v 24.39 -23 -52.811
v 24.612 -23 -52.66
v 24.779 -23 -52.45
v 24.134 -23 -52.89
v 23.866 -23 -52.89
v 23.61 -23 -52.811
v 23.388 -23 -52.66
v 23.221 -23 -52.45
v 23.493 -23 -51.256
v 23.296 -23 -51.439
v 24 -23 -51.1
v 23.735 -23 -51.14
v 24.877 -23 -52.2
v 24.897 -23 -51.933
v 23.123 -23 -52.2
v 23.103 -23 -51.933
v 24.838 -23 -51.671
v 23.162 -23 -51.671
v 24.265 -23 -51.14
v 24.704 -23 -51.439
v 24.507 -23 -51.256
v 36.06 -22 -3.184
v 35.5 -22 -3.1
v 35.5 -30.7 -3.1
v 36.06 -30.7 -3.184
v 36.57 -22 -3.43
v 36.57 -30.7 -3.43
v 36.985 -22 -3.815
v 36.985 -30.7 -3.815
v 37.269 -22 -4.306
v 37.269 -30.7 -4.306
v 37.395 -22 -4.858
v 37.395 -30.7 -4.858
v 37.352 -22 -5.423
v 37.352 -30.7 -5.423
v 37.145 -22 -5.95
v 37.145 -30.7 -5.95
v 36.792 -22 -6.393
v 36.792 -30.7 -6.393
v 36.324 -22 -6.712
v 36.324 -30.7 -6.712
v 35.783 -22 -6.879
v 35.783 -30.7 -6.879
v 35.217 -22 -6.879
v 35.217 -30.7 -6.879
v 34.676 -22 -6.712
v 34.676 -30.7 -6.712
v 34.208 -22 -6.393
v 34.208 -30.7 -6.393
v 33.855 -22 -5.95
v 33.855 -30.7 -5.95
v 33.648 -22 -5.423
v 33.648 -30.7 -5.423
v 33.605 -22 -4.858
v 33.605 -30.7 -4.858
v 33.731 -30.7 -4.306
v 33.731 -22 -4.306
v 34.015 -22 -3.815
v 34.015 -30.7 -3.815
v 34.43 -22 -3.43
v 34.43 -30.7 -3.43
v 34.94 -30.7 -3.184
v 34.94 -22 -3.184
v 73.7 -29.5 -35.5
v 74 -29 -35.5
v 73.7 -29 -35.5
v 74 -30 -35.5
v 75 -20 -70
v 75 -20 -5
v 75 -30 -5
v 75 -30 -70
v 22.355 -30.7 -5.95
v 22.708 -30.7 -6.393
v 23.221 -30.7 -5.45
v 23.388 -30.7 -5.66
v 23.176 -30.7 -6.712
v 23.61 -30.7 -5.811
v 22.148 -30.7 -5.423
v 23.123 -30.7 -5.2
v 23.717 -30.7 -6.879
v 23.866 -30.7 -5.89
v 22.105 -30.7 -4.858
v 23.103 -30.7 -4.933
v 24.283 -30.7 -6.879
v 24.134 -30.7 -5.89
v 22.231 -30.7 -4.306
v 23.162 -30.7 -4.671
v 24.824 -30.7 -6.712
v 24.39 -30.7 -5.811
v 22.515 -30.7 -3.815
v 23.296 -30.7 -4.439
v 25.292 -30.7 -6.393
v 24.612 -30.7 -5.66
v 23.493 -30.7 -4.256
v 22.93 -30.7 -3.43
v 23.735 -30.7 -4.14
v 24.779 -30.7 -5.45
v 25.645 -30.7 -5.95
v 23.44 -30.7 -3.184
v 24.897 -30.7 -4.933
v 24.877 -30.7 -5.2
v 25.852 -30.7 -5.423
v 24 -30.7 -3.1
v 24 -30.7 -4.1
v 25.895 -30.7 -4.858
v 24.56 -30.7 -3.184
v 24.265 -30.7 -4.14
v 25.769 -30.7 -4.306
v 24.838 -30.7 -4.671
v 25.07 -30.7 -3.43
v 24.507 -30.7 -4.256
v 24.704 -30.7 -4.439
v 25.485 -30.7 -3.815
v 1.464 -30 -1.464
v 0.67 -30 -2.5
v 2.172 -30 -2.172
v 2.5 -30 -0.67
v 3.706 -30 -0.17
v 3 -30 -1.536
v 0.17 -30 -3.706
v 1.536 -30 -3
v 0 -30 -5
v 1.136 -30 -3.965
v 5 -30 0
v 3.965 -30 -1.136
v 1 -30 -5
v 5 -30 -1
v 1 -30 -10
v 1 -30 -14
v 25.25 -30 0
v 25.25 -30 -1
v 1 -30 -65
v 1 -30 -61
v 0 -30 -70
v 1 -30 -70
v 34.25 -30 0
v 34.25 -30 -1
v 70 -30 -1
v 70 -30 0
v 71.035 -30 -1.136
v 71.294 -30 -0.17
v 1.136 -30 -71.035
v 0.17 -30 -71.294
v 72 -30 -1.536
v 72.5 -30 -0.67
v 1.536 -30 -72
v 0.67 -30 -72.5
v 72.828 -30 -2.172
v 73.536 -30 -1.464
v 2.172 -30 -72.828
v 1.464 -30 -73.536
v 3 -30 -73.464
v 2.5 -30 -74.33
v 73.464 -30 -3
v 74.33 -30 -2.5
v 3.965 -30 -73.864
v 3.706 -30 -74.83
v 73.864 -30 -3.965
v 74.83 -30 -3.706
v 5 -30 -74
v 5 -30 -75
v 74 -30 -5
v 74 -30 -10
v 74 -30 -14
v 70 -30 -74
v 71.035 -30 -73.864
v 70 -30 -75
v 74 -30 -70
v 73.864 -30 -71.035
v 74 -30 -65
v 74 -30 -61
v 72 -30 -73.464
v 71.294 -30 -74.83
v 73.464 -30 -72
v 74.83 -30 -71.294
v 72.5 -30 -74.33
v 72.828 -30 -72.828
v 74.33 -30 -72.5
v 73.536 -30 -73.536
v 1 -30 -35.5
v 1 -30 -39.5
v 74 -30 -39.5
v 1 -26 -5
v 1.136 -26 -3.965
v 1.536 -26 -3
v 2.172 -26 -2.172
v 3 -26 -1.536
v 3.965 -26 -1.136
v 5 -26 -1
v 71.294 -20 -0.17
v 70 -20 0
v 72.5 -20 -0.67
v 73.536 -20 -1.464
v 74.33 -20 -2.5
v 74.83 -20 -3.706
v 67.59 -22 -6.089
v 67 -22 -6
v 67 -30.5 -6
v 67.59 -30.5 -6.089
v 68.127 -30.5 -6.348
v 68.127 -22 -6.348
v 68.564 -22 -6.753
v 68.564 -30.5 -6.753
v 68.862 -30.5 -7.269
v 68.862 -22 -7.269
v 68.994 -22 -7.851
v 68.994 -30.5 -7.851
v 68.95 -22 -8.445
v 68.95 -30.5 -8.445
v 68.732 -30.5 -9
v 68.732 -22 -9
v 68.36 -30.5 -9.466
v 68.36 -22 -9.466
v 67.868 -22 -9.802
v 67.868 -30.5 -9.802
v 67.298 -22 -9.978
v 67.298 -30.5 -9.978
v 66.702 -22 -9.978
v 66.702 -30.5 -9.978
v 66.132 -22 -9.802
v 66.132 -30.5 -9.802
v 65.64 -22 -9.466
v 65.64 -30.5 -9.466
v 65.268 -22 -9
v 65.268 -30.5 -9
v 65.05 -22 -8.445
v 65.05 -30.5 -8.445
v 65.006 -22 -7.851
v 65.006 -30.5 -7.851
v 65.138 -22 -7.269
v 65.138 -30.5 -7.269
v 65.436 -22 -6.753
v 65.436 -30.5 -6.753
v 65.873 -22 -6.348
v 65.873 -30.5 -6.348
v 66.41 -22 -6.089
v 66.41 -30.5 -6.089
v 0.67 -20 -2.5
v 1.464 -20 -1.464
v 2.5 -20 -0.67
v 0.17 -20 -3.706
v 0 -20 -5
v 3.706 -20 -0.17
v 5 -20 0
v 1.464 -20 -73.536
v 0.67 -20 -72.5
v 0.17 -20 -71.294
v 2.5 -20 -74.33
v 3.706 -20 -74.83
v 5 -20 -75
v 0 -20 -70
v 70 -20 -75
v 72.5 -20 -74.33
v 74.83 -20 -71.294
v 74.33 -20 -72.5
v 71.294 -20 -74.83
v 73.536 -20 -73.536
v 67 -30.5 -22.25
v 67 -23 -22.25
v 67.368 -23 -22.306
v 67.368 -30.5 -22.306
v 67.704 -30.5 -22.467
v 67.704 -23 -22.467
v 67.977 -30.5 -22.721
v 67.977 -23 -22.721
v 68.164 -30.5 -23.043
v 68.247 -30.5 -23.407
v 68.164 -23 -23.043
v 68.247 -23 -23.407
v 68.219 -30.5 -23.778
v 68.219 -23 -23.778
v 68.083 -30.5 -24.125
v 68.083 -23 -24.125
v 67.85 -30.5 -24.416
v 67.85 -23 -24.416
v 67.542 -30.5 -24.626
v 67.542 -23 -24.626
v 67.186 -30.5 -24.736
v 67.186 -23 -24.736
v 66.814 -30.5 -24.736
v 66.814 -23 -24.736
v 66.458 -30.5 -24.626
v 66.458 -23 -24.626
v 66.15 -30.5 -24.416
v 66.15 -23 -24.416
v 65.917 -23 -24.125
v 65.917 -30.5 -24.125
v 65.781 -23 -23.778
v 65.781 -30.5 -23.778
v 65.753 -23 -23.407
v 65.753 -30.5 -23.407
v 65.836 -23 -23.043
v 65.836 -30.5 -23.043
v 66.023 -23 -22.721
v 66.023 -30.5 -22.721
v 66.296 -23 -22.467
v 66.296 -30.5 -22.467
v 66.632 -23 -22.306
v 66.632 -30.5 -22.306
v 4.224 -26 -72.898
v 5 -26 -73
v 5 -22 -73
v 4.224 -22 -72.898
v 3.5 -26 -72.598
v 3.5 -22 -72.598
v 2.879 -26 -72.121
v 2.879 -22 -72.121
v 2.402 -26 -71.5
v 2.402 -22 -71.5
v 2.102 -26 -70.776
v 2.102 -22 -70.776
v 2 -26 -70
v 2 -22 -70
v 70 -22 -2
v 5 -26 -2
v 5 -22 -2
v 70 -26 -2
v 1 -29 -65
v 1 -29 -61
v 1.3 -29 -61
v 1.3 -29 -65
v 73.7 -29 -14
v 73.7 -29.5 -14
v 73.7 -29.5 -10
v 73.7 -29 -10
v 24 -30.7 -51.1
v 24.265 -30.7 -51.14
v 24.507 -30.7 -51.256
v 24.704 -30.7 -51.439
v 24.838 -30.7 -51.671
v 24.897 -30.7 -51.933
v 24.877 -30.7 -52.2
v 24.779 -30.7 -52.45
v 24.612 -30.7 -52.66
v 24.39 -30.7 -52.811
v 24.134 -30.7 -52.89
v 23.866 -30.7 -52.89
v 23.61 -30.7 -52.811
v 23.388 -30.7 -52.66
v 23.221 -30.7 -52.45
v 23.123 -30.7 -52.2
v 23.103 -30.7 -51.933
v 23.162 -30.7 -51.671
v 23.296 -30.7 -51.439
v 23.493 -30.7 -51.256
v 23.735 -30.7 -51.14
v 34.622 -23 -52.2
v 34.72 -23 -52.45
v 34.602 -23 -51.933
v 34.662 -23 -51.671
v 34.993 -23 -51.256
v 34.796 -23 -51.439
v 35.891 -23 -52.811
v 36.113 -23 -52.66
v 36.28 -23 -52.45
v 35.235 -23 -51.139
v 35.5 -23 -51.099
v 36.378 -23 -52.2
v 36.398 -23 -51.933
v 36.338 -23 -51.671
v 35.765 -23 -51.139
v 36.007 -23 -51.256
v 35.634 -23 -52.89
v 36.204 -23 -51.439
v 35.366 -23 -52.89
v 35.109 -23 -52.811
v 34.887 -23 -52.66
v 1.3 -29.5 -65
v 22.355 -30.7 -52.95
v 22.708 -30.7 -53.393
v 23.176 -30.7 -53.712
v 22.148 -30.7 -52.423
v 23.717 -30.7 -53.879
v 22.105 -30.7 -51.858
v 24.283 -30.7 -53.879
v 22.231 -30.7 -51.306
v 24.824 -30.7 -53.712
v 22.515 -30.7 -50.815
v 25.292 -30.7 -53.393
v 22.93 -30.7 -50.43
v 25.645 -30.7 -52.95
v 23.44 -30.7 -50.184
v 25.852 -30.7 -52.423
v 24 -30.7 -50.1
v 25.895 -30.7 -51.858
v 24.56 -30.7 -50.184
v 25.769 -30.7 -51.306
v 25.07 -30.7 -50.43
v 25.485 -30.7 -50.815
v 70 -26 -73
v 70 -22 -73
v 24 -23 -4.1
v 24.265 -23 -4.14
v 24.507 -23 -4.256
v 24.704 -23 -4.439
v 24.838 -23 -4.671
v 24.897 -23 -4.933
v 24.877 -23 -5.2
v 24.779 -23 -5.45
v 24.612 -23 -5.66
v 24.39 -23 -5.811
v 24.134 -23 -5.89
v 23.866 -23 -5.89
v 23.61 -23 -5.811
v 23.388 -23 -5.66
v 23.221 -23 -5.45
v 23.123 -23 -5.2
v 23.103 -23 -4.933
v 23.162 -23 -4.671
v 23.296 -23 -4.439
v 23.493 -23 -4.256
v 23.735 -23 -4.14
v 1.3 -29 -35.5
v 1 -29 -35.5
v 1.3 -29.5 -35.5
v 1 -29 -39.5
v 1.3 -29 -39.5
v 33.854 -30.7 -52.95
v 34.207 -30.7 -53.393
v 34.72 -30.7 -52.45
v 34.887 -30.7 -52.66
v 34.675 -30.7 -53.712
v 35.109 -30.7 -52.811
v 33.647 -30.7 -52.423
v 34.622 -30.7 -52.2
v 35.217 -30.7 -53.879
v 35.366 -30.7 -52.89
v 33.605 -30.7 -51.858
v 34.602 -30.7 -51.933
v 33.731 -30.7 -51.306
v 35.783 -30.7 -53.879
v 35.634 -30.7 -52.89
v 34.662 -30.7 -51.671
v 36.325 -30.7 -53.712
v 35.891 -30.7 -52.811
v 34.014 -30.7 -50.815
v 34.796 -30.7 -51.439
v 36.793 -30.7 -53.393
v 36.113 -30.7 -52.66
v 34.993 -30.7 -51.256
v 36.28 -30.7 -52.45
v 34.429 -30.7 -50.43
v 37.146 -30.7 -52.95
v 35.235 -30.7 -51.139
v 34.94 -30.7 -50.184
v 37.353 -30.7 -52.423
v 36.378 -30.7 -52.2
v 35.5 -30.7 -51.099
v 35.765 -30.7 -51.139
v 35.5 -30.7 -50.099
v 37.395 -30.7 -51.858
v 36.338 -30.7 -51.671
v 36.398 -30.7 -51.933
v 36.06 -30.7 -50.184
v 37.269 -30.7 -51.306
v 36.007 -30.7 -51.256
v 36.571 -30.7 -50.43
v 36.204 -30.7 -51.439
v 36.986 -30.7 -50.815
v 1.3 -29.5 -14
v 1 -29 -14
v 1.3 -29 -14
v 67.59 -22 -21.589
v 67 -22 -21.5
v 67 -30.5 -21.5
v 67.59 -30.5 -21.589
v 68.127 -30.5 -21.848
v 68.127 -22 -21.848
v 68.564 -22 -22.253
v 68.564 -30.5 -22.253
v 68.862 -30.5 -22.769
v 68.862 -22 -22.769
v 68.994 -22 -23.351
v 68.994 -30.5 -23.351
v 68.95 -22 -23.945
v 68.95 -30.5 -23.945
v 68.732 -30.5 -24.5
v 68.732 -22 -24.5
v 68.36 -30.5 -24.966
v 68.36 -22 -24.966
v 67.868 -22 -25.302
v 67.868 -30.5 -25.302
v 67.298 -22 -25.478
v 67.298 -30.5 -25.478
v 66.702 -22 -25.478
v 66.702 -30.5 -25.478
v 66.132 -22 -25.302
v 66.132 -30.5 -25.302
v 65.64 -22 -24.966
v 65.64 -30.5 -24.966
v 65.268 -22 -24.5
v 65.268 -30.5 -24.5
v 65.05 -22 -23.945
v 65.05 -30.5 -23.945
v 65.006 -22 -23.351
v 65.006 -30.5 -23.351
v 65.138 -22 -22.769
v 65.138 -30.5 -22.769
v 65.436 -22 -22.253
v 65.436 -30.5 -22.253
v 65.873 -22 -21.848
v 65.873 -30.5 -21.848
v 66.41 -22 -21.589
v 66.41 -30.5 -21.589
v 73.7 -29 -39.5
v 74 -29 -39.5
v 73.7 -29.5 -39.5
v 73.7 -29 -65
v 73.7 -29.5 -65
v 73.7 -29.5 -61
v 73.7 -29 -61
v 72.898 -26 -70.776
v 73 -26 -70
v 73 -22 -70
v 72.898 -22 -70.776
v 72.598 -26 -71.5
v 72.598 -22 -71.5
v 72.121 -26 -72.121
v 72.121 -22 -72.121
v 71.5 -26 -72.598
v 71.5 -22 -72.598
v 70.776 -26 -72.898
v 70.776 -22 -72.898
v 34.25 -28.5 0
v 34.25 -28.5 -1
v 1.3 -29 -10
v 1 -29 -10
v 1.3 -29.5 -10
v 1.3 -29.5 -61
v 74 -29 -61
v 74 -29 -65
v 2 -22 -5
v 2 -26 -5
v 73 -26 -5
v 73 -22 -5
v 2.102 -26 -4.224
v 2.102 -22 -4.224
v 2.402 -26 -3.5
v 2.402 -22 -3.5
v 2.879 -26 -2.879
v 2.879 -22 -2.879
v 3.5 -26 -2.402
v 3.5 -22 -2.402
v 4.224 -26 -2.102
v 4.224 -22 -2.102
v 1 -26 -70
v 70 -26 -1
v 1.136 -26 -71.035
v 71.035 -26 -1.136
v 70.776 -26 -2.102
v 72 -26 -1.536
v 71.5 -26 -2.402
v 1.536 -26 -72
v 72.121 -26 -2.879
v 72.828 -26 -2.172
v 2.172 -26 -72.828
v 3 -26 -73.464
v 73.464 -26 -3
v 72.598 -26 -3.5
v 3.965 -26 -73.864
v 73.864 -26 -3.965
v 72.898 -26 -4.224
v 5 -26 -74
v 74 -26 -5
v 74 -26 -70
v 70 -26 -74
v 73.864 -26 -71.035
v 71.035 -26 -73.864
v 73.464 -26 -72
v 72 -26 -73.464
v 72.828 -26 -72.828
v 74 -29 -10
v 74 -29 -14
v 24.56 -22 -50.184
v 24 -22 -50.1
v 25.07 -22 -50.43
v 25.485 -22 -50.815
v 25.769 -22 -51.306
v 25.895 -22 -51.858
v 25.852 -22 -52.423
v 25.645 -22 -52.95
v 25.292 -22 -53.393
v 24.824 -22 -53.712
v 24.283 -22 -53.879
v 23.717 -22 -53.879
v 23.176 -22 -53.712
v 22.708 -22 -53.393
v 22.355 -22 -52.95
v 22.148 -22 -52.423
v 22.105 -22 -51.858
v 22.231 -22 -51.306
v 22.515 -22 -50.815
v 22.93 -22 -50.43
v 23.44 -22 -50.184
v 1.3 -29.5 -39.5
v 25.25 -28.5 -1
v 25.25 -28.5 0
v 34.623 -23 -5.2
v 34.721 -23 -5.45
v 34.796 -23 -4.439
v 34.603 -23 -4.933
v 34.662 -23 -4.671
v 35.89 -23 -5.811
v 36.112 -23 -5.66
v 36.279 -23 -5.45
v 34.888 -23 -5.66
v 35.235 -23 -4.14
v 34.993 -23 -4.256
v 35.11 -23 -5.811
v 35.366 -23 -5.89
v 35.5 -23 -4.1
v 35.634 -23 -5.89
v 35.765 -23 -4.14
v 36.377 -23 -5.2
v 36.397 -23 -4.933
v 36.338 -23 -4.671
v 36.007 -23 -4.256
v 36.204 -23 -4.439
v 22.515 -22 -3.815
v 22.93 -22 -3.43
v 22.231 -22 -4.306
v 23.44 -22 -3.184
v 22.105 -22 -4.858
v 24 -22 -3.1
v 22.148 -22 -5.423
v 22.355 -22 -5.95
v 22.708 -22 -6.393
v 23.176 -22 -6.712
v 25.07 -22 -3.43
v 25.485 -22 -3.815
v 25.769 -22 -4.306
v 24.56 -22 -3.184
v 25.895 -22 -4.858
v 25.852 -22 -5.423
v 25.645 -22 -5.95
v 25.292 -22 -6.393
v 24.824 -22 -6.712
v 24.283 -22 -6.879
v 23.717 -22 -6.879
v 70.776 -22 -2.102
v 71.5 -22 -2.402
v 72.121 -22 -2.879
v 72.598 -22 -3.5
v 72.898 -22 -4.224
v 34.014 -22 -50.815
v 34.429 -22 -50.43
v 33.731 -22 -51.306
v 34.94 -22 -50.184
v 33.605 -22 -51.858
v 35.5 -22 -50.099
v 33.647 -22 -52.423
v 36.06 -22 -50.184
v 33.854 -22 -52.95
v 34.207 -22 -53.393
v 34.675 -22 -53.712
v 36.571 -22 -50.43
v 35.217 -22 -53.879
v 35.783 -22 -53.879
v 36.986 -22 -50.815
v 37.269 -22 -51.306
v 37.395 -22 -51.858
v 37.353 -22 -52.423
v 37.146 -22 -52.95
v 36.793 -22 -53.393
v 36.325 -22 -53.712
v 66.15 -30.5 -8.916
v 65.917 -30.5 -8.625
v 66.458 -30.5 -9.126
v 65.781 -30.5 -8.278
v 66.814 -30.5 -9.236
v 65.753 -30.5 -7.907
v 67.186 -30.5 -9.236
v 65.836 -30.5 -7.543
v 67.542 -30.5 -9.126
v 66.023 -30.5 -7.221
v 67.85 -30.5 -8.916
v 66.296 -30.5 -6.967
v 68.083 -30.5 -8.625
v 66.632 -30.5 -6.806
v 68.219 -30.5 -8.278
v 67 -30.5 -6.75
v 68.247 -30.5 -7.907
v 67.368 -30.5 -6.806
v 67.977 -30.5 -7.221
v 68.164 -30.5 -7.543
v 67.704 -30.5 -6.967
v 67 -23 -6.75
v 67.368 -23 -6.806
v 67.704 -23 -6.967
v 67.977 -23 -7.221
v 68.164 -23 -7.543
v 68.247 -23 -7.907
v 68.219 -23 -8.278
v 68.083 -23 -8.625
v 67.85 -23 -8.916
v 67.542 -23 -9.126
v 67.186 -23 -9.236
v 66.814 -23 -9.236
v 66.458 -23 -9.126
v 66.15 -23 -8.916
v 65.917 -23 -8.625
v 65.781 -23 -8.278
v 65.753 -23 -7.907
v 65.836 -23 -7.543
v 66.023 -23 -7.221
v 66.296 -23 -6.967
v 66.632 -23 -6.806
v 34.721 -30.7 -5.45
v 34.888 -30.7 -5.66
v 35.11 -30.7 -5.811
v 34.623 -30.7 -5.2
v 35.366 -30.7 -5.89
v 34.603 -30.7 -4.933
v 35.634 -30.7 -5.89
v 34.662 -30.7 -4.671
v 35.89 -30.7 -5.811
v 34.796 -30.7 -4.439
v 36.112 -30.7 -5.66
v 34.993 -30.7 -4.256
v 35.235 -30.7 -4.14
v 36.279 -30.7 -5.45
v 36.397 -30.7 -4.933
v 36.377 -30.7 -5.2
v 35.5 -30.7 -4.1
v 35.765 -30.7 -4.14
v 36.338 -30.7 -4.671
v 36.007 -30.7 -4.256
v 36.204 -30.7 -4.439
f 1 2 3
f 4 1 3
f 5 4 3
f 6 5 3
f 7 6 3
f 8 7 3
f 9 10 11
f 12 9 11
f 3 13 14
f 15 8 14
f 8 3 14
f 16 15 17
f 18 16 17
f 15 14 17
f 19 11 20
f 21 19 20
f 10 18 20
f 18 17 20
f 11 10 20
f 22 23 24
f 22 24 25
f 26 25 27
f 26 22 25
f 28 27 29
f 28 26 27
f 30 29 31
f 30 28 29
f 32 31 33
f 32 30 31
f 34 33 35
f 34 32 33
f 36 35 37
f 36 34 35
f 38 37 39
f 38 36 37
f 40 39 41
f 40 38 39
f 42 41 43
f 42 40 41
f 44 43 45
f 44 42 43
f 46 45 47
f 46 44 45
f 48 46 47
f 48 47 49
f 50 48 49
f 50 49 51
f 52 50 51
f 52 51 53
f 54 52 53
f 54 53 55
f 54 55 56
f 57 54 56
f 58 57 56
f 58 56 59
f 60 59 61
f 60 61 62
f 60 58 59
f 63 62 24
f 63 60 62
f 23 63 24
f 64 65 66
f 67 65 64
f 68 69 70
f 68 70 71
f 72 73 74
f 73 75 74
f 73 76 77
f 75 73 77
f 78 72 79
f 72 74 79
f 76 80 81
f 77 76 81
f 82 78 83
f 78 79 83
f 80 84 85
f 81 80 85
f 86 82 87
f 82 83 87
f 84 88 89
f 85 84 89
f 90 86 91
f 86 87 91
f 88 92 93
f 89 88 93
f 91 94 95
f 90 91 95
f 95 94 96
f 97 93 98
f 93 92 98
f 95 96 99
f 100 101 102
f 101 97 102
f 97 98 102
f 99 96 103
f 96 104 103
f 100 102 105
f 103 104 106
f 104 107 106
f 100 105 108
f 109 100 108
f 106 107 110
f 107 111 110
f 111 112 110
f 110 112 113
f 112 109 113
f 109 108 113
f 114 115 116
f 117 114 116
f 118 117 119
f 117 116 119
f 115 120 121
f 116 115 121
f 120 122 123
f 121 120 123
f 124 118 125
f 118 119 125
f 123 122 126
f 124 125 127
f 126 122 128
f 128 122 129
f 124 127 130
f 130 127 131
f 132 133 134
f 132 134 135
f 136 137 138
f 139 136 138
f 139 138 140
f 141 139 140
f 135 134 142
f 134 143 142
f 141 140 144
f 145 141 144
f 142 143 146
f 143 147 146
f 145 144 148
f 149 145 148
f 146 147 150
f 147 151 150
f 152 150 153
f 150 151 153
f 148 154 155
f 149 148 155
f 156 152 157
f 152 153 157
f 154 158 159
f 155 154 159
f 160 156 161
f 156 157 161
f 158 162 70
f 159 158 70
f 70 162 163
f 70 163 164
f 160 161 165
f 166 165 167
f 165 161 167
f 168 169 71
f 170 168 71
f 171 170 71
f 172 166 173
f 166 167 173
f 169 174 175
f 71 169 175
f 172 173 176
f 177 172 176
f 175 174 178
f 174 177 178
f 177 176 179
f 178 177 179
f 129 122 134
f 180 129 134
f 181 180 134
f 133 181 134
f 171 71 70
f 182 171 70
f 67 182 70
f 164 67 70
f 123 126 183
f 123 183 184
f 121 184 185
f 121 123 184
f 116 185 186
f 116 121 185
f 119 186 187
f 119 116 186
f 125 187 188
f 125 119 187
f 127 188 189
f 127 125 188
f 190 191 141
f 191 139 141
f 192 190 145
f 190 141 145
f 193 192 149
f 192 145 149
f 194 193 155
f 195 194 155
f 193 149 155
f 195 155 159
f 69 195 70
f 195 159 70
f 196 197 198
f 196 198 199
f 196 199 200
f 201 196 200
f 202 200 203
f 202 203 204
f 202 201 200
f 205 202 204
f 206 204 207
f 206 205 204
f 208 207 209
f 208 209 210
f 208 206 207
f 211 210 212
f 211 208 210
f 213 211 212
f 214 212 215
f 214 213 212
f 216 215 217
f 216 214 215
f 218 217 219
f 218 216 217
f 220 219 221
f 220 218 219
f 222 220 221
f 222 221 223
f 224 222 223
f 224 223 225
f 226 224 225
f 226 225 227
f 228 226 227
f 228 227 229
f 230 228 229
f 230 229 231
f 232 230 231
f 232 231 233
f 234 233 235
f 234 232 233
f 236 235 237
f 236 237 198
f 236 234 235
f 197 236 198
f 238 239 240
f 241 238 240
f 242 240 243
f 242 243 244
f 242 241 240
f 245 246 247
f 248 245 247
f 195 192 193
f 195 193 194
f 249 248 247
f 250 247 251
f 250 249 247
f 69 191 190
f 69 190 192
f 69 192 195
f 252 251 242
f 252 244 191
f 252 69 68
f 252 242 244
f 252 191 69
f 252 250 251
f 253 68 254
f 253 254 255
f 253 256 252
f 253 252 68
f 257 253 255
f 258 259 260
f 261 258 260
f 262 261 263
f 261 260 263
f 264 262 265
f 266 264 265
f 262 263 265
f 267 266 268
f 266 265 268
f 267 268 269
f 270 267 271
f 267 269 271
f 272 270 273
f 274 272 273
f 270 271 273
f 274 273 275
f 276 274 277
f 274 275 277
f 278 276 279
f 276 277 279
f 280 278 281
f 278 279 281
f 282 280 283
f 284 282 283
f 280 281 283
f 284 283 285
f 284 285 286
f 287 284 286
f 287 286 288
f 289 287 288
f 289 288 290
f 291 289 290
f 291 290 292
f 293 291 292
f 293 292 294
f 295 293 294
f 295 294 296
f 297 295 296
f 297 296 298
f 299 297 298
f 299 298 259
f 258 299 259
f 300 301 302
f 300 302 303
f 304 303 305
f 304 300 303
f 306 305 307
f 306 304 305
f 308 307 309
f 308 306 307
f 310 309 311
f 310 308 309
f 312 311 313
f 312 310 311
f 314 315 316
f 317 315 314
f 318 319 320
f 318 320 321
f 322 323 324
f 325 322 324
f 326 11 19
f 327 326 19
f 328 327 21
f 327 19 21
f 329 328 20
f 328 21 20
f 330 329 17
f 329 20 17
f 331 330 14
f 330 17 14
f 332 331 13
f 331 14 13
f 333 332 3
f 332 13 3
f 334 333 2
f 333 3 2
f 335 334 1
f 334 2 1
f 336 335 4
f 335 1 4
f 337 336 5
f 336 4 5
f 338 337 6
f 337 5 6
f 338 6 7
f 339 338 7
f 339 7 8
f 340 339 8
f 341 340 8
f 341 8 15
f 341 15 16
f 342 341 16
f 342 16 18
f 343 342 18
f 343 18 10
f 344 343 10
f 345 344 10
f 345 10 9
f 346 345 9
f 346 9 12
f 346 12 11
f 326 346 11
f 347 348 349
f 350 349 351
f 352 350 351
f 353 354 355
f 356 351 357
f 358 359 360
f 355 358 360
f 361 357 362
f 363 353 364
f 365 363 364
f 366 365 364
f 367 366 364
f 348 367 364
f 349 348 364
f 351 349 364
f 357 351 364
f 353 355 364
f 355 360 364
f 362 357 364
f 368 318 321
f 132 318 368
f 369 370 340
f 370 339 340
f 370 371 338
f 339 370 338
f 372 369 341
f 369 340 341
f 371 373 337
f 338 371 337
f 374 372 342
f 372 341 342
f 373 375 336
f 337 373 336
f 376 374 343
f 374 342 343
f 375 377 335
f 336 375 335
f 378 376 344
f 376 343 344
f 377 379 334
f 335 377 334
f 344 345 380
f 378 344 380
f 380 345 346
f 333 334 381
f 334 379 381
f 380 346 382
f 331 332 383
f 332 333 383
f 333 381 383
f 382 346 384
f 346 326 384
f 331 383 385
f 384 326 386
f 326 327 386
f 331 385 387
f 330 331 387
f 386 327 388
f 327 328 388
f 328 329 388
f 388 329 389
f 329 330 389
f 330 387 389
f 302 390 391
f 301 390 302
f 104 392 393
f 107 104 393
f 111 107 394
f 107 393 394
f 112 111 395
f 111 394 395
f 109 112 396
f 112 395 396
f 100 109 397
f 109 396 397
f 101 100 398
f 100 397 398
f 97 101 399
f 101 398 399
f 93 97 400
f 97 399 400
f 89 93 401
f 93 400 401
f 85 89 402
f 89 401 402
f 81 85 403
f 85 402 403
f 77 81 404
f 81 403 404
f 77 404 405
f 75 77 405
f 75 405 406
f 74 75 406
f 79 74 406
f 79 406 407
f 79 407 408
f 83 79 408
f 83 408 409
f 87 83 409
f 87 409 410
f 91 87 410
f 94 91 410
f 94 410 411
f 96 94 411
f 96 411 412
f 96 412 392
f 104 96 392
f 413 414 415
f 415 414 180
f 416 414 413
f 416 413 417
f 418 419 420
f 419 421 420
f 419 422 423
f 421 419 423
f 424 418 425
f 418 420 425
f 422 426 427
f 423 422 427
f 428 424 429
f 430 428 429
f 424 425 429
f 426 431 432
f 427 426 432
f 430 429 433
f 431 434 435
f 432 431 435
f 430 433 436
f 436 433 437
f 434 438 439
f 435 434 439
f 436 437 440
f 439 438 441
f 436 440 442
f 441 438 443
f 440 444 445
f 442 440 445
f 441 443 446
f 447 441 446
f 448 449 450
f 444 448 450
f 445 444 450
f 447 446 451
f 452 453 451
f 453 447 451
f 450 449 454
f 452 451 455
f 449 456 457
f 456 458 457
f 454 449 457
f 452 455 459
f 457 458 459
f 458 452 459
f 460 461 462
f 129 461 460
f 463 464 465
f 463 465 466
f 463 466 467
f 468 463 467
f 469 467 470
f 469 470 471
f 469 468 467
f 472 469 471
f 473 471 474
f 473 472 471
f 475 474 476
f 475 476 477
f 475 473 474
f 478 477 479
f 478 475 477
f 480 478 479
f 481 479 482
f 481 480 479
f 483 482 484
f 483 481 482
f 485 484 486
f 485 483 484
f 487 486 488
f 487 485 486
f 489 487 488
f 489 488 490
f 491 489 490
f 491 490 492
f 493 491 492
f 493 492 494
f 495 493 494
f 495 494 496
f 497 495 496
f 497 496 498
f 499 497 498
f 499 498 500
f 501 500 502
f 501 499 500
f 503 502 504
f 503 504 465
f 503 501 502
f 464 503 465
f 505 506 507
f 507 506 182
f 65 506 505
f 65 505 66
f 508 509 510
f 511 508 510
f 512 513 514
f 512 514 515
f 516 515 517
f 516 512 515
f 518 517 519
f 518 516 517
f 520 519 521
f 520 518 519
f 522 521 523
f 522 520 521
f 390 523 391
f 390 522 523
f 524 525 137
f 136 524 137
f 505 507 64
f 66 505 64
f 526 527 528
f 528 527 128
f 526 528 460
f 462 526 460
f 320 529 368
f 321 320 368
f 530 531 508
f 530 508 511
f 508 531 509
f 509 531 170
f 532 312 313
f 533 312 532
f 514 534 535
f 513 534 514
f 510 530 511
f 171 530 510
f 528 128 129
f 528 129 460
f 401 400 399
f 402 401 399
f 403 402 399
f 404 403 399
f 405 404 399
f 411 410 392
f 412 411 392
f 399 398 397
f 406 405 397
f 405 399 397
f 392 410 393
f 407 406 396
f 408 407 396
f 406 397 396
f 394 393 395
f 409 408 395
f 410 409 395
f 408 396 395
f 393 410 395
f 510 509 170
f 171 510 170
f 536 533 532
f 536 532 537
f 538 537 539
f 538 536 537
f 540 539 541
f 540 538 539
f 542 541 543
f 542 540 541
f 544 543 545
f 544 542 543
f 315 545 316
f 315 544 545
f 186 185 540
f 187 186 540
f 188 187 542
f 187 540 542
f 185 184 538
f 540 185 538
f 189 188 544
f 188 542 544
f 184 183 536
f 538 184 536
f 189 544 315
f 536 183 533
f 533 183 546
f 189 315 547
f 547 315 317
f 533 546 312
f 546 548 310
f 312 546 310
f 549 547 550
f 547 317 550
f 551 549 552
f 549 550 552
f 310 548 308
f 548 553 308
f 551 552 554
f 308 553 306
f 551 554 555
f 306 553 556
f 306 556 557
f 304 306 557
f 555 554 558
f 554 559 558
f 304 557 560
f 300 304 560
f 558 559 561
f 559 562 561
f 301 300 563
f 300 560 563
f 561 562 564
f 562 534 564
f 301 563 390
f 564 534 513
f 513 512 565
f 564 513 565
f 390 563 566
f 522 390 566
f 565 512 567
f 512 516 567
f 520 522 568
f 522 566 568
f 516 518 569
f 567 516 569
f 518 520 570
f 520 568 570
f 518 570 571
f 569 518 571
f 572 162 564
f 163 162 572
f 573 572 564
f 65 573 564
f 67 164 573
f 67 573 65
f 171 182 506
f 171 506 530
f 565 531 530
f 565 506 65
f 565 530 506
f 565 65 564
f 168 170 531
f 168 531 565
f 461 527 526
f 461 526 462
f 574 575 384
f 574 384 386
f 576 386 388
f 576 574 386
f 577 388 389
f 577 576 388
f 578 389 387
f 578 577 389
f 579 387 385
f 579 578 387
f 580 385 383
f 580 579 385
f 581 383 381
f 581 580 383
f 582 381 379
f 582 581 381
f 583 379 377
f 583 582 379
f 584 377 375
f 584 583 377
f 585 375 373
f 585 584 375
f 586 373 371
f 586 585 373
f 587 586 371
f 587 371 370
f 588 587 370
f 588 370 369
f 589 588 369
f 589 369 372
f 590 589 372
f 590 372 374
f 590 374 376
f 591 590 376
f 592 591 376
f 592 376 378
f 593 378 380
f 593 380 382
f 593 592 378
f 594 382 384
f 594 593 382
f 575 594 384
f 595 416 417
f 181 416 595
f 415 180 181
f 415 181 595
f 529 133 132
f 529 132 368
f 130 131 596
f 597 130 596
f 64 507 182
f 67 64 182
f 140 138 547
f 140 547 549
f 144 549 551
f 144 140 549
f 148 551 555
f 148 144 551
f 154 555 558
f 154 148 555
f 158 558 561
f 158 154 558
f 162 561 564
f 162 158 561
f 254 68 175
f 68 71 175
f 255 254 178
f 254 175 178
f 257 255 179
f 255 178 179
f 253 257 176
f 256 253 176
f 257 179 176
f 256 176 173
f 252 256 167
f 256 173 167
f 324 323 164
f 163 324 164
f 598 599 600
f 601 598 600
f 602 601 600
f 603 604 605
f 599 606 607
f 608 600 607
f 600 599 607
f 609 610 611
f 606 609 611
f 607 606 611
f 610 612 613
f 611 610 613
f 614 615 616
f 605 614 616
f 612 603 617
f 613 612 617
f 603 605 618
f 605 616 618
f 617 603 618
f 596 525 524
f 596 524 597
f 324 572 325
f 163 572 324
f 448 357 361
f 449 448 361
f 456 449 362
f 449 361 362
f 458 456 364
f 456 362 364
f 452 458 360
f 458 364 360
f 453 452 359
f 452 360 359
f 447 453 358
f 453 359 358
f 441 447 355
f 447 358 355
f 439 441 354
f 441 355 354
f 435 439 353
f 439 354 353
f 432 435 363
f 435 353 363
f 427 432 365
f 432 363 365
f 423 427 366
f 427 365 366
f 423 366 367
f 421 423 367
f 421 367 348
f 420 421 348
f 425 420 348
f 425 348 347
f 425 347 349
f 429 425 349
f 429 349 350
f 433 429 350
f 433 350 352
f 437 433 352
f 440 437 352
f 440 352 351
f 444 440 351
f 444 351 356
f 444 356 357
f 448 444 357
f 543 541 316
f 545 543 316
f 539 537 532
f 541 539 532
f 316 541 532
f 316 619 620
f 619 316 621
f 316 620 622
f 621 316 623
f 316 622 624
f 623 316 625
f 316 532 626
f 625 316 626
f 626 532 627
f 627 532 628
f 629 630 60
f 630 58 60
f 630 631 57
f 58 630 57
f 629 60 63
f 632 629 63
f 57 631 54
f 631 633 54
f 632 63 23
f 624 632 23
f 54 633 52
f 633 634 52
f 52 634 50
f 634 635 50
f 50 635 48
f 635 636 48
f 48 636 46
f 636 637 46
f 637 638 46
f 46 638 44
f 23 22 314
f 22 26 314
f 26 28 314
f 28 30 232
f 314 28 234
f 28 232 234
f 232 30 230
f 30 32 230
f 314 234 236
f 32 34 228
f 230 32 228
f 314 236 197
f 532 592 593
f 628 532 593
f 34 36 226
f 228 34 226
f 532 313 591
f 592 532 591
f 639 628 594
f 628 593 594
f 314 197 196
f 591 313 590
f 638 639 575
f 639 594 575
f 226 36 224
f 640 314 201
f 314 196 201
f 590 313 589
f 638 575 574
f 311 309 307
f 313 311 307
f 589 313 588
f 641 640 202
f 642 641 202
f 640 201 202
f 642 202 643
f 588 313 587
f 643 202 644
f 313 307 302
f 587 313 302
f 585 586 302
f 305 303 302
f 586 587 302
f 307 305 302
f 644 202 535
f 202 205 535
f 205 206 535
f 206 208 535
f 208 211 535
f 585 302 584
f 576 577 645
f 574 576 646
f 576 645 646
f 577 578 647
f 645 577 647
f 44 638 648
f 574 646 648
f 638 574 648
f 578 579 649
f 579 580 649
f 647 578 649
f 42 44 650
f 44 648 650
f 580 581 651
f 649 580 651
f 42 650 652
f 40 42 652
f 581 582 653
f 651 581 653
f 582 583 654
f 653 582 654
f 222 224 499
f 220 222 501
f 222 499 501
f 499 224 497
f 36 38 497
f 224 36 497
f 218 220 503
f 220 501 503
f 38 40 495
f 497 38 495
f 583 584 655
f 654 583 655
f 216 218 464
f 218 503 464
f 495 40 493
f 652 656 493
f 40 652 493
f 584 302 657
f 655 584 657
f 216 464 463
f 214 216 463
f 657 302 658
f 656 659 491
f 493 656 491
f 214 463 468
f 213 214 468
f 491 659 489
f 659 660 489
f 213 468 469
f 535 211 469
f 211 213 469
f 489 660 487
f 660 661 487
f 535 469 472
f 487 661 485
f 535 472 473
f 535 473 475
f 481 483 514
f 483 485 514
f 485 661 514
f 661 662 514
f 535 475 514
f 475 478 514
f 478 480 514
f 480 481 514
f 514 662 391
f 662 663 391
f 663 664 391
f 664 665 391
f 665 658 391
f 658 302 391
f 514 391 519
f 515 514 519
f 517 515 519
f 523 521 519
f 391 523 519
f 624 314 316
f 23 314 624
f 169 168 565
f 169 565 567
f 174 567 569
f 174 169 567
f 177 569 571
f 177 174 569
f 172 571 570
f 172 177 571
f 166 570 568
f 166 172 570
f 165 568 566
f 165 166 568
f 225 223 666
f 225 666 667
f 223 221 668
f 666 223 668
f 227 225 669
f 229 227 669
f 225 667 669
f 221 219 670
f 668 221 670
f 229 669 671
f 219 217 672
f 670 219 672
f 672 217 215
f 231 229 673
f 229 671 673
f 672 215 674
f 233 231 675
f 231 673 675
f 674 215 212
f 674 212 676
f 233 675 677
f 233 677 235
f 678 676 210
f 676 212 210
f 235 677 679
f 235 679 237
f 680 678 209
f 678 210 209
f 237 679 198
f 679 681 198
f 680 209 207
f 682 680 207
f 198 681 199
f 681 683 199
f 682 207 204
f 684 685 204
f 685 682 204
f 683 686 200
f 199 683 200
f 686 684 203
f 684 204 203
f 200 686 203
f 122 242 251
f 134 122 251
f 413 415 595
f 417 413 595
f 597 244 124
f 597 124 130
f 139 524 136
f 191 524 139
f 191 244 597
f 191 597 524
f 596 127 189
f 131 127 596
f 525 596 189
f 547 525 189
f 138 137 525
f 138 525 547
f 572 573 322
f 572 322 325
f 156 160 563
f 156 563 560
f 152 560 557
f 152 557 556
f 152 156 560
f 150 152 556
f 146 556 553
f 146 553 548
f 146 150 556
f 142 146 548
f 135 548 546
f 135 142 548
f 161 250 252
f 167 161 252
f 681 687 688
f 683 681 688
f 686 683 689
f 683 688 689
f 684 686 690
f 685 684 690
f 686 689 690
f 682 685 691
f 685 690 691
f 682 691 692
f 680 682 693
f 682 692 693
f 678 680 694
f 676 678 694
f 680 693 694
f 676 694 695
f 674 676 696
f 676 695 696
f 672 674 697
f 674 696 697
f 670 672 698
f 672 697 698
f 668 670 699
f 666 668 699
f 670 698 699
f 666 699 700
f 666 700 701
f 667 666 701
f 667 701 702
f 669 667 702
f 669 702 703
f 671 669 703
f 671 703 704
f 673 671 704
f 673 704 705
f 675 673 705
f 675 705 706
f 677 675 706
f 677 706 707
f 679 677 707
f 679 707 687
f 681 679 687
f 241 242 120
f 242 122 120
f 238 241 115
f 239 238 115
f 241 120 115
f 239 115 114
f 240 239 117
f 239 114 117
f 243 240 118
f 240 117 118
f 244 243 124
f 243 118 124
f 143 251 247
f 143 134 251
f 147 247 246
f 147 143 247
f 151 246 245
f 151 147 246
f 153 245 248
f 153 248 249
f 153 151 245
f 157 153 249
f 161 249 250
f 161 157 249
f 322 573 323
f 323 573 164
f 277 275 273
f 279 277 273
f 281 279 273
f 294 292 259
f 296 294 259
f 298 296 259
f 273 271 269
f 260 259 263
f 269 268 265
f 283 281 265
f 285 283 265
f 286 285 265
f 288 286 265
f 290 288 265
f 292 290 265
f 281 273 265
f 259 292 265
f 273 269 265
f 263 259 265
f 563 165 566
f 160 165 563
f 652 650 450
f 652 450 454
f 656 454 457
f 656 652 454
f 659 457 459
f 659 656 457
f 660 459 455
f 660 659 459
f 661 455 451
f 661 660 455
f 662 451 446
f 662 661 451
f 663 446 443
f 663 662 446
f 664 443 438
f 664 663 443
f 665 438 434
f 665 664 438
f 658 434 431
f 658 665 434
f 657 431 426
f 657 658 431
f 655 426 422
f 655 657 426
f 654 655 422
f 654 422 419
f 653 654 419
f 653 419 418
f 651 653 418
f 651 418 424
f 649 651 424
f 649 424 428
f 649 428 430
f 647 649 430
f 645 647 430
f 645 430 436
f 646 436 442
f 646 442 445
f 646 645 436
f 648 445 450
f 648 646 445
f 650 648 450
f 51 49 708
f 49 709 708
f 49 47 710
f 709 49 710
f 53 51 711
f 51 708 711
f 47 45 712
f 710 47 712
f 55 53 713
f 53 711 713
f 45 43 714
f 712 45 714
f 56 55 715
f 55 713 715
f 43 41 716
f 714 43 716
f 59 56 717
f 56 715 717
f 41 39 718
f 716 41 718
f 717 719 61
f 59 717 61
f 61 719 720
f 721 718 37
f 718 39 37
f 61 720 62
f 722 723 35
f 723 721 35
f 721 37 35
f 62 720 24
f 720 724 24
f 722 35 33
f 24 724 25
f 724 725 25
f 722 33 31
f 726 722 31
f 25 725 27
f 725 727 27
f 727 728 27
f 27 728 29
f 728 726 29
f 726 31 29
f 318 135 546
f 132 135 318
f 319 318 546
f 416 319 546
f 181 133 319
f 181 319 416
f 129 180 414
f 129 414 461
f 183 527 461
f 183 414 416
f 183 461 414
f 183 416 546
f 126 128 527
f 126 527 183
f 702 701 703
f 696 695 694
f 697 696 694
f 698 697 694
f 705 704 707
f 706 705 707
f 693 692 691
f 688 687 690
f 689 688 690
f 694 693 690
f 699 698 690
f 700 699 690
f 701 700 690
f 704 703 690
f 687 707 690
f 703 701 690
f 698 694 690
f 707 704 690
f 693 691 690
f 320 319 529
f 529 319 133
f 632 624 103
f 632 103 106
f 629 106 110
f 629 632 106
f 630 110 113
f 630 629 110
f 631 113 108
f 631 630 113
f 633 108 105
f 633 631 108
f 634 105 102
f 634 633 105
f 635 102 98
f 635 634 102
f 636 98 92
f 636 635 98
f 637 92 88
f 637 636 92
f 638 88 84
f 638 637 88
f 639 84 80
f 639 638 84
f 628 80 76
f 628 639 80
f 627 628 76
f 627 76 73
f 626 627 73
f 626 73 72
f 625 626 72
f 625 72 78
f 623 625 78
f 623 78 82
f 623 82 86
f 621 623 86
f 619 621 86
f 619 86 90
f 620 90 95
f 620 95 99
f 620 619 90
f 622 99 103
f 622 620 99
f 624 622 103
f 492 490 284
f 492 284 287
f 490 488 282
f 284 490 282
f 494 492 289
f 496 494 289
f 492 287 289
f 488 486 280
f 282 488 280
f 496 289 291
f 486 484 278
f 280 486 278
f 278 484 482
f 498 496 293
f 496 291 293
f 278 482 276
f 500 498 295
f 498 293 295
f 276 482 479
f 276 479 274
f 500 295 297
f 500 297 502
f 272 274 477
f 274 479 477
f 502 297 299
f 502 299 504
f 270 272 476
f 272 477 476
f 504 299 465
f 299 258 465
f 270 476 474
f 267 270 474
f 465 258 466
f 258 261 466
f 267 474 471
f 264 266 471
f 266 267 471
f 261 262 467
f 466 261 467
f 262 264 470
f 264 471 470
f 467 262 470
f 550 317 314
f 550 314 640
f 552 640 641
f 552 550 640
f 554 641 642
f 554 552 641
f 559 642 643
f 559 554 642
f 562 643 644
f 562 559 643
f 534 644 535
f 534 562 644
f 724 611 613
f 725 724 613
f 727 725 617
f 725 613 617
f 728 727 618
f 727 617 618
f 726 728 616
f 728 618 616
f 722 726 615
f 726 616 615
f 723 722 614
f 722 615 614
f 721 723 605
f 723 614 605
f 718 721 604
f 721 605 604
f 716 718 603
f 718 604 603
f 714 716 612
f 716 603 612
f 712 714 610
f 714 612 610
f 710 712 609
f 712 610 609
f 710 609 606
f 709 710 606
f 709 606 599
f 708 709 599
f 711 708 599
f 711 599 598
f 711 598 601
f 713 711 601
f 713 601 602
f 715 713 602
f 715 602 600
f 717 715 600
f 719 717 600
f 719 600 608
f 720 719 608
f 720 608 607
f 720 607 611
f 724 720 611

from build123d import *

# Parameters (mm, degrees)
SZKIC1_W                    = 75
SZKIC1_H                    = 75
DODANIE_WYCI_GNI_CIE1_DEPTH = 10
ZAOKR_GLENIE1_R             = 5
WYTNIJ_WYCI_GNI_CIE1_DEPTH  = 8
WYTNIJ_WYCI_GNI_CIE2_DEPTH  = 4
SZKIC7_R                    = 1.9
SZKIC7_R_2                  = 0.9
SZKIC7_R_3                  = 1.900523095
SZKIC7_R_4                  = 0.900523095
DODANIE_WYCI_GNI_CIE2_DEPTH = 8.7
SZKIC9_R                    = 0.900523095
SZKIC9_R_2                  = 0.9
DODANIE_WYCI_GNI_CIE3_DEPTH = 1
SZKIC10_R                   = 1.25
DODANIE_WYCI_GNI_CIE4_DEPTH = 1
SZKIC11_R                   = 2
SZKIC11_R_2                 = 1.25
DODANIE_WYCI_GNI_CIE5_DEPTH = 8.5
WYTNIJ_WYCI_GNI_CIE20_DEPTH = 10
SZKIC22_W                   = 4
SZKIC22_H                   = 1
DODANIE_WYCI_GNI_CIE6_DEPTH = 0.3
SZKIC24_W                   = 4
SZKIC24_H                   = 1
DODANIE_WYCI_GNI_CIE7_DEPTH = 0.3
WYTNIJ_WYCI_GNI_CIE13_DEPTH = 55
WYTNIJ_WYCI_GNI_CIE14_DEPTH = 55


with BuildPart() as part:
    # Szkic1 → Dodanie-wyciągnięcie1 (new body)
    with BuildSketch(Plane(origin=(0, 0, 0), x_dir=(1, 0, 0), z_dir=(0, 1, 0))):
        with Locations((37.5, 37.5)):
            Rectangle(SZKIC1_W, SZKIC1_H)
    extrude(amount=DODANIE_WYCI_GNI_CIE1_DEPTH)

    # Zaokrąglenie1
    zaokr_glenie1_edges = [part.edges().sort_by_distance(p)[0] for p in [
        (0, 5, 0),
        (0, 5, -75),
        (75, 5, -75),
        (75, 5, 0),
    ]]
    fillet(zaokr_glenie1_edges, radius=ZAOKR_GLENIE1_R)

    # Szkic4 → Wytnij-wyciągnięcie1 (cut)
    with BuildSketch(Plane(origin=(0, 10, 0), x_dir=(1, 0, 0), z_dir=(0, 1, 0))):
        with BuildLine():
            Line((2, 70), (2, 5))
            ThreePointArc((2, 5), (2.878679656, 2.878679656), (5, 2))
            Line((5, 2), (70, 2))
            ThreePointArc((70, 2), (72.121320344, 2.878679656), (73, 5))
            Line((73, 5), (73, 70))
            ThreePointArc((73, 70), (72.121320344, 72.121320344), (70, 73))
            Line((70, 73), (5, 73))
            ThreePointArc((5, 73), (2.878679656, 72.121320344), (2, 70))
        make_face()
    extrude(amount=-WYTNIJ_WYCI_GNI_CIE1_DEPTH, mode=Mode.SUBTRACT)

    # Szkic6 → Wytnij-wyciągnięcie2 (cut)
    with BuildSketch(Plane(origin=(0, 10, 0), x_dir=(1, 0, 0), z_dir=(0, 1, 0))):
        with BuildLine():
            Line((1, 70), (1, 5))
            ThreePointArc((1, 5), (2.171572875, 2.171572875), (5, 1))
            Line((5, 1), (70, 1))
            ThreePointArc((70, 1), (72.828427125, 2.171572875), (74, 5))
            Line((74, 5), (74, 70))
            ThreePointArc((74, 70), (72.828427125, 72.828427125), (70, 74))
            Line((70, 74), (5, 74))
            ThreePointArc((5, 74), (2.171572875, 72.828427125), (1, 70))
        make_face()
        with BuildLine():
            Line((2, 70), (2, 5))
            ThreePointArc((2, 5), (2.878679656, 2.878679656), (5, 2))
            Line((5, 2), (70, 2))
            ThreePointArc((70, 2), (72.121320344, 2.878679656), (73, 5))
            Line((73, 5), (73, 70))
            ThreePointArc((73, 70), (72.121320344, 72.121320344), (70, 73))
            Line((70, 73), (5, 73))
            ThreePointArc((5, 73), (2.878679656, 72.121320344), (2, 70))
        make_face(mode=Mode.SUBTRACT)
    extrude(amount=-WYTNIJ_WYCI_GNI_CIE2_DEPTH, mode=Mode.SUBTRACT)

    # Szkic7 → Dodanie-wyciągnięcie2 (add)
    # profile 1 of 4: a face of its own
    with BuildSketch(Plane(origin=(0, 2, 0), x_dir=(1, 0, 0), z_dir=(0, 1, 0))):
        with Locations(Location((24, 52, 0), (0, 0, 270))):
            Circle(SZKIC7_R)
        with Locations(Location((24, 52, 0), (0, 0, 270))):
            Circle(SZKIC7_R_2, mode=Mode.SUBTRACT)
    # profile 2 of 4: a face of its own
    with BuildSketch(Plane(origin=(0, 2, 0), x_dir=(1, 0, 0), z_dir=(0, 1, 0))):
        with Locations(Location((35.5, 52, 0), (0, 0, 270))):
            Circle(SZKIC7_R_3)
        with Locations(Location((35.5, 52, 0), (0, 0, 270))):
            Circle(SZKIC7_R_4, mode=Mode.SUBTRACT)
    # profile 3 of 4: a face of its own
    with BuildSketch(Plane(origin=(0, 2, 0), x_dir=(1, 0, 0), z_dir=(0, 1, 0))):
        with Locations(Location((35.5, 5, 0), (0, 0, 270))):
            Circle(SZKIC7_R)
        with Locations(Location((35.5, 5, 0), (0, 0, 270))):
            Circle(SZKIC7_R_2, mode=Mode.SUBTRACT)
    # profile 4 of 4: a face of its own
    with BuildSketch(Plane(origin=(0, 2, 0), x_dir=(1, 0, 0), z_dir=(0, 1, 0))):
        with Locations(Location((24, 5, 0), (0, 0, 270))):
            Circle(SZKIC7_R)
        with Locations(Location((24, 5, 0), (0, 0, 270))):
            Circle(SZKIC7_R_2, mode=Mode.SUBTRACT)
    extrude(amount=DODANIE_WYCI_GNI_CIE2_DEPTH)

    # Szkic9 → Dodanie-wyciągnięcie3 (add)
    with BuildSketch(Plane(origin=(0, 2, 0), x_dir=(1, 0, 0), z_dir=(0, 1, 0))):
        with Locations(Location((35.5, 52, 0), (0, 0, 270))):
            Circle(SZKIC9_R)
        with Locations(Location((35.5, 5, 0), (0, 0, 270))):
            Circle(SZKIC9_R_2)
        with Locations(Location((24, 5, 0), (0, 0, 270))):
            Circle(SZKIC9_R_2)
        with Locations(Location((24, 52, 0), (0, 0, 270))):
            Circle(SZKIC9_R_2)
    extrude(amount=DODANIE_WYCI_GNI_CIE3_DEPTH)

    # Szkic10 → Dodanie-wyciągnięcie4 (add)
    with BuildSketch(Plane(origin=(0, 2, 0), x_dir=(1, 0, 0), z_dir=(0, 1, 0))):
        with Locations(Location((67, 23.5, 0), (0, 0, 270))):
            Circle(SZKIC10_R)
        with Locations(Location((67, 8, 0), (0, 0, 270))):
            Circle(SZKIC10_R)
    extrude(amount=DODANIE_WYCI_GNI_CIE4_DEPTH)

    # Szkic11 → Dodanie-wyciągnięcie5 (add)
    # profile 1 of 2: a face of its own
    with BuildSketch(Plane(origin=(0, 2, 0), x_dir=(1, 0, 0), z_dir=(0, 1, 0))):
        with Locations(Location((67, 23.5, 0), (0, 0, 270))):
            Circle(SZKIC11_R)
        with Locations(Location((67, 23.5, 0), (0, 0, 270))):
            Circle(SZKIC11_R_2, mode=Mode.SUBTRACT)
    # profile 2 of 2: a face of its own
    with BuildSketch(Plane(origin=(0, 2, 0), x_dir=(1, 0, 0), z_dir=(0, 1, 0))):
        with Locations(Location((67, 8, 0), (0, 0, 270))):
            Circle(SZKIC11_R)
        with Locations(Location((67, 8, 0), (0, 0, 270))):
            Circle(SZKIC11_R_2, mode=Mode.SUBTRACT)
    extrude(amount=DODANIE_WYCI_GNI_CIE5_DEPTH)

    # Szkic19 → Wytnij-wyciągnięcie20 (cut)
    with BuildSketch(Plane(origin=(0, 0, -2), x_dir=(-1, 0, 0), z_dir=(0, 0, -1))):
        Polygon((-34.25, 10), (-25.25, 10), (-25.25, 8.5), (-26.5, 8.5), (-32.5, 8.5), (-34.25, 8.5), align=None)
    extrude(amount=-WYTNIJ_WYCI_GNI_CIE20_DEPTH, mode=Mode.SUBTRACT)

    # Szkic22 → Dodanie-wyciągnięcie6 (add)
    with BuildSketch(Plane.ZY.offset(-74)):
        with Locations((-37.5, 9.5)):
            Rectangle(SZKIC22_W, SZKIC22_H)
        with Locations((-63, 9.5)):
            Rectangle(SZKIC22_W, SZKIC22_H)
        with Locations((-12, 9.5)):
            Rectangle(SZKIC22_W, SZKIC22_H)
    extrude(amount=DODANIE_WYCI_GNI_CIE6_DEPTH)

    # Szkic24 → Dodanie-wyciągnięcie7 (add)
    with BuildSketch(Plane(origin=(1, 0, 0), x_dir=(0, 0, -1), z_dir=(1, 0, 0))):
        with Locations((12, 9.5)):
            Rectangle(SZKIC24_W, SZKIC24_H)
        with Locations((63, 9.5)):
            Rectangle(SZKIC24_W, SZKIC24_H)
        with Locations((37.5, 9.5)):
            Rectangle(SZKIC24_W, SZKIC24_H)
    extrude(amount=DODANIE_WYCI_GNI_CIE7_DEPTH)

    # Szkic25 → Wytnij-wyciągnięcie13 (cut)
    with BuildSketch(Plane.XY.offset(-10)):
        Polygon((1, 10), (1.3, 9.5), (1.3, 10), align=None)
    extrude(amount=-WYTNIJ_WYCI_GNI_CIE13_DEPTH, mode=Mode.SUBTRACT)

    # Szkic26 → Wytnij-wyciągnięcie14 (cut)
    with BuildSketch(Plane(origin=(0, 0, -65), x_dir=(-1, 0, 0), z_dir=(0, 0, -1))):
        Polygon((-74, 10), (-73.7, 10), (-73.7, 9.5), align=None)
    extrude(amount=-WYTNIJ_WYCI_GNI_CIE14_DEPTH, mode=Mode.SUBTRACT)


with BuildPart() as body_2:
    # Lustro5: mirrored copy
    add(part.part.mirror(Plane.ZX.offset(-10)))


solid = body_2.part
